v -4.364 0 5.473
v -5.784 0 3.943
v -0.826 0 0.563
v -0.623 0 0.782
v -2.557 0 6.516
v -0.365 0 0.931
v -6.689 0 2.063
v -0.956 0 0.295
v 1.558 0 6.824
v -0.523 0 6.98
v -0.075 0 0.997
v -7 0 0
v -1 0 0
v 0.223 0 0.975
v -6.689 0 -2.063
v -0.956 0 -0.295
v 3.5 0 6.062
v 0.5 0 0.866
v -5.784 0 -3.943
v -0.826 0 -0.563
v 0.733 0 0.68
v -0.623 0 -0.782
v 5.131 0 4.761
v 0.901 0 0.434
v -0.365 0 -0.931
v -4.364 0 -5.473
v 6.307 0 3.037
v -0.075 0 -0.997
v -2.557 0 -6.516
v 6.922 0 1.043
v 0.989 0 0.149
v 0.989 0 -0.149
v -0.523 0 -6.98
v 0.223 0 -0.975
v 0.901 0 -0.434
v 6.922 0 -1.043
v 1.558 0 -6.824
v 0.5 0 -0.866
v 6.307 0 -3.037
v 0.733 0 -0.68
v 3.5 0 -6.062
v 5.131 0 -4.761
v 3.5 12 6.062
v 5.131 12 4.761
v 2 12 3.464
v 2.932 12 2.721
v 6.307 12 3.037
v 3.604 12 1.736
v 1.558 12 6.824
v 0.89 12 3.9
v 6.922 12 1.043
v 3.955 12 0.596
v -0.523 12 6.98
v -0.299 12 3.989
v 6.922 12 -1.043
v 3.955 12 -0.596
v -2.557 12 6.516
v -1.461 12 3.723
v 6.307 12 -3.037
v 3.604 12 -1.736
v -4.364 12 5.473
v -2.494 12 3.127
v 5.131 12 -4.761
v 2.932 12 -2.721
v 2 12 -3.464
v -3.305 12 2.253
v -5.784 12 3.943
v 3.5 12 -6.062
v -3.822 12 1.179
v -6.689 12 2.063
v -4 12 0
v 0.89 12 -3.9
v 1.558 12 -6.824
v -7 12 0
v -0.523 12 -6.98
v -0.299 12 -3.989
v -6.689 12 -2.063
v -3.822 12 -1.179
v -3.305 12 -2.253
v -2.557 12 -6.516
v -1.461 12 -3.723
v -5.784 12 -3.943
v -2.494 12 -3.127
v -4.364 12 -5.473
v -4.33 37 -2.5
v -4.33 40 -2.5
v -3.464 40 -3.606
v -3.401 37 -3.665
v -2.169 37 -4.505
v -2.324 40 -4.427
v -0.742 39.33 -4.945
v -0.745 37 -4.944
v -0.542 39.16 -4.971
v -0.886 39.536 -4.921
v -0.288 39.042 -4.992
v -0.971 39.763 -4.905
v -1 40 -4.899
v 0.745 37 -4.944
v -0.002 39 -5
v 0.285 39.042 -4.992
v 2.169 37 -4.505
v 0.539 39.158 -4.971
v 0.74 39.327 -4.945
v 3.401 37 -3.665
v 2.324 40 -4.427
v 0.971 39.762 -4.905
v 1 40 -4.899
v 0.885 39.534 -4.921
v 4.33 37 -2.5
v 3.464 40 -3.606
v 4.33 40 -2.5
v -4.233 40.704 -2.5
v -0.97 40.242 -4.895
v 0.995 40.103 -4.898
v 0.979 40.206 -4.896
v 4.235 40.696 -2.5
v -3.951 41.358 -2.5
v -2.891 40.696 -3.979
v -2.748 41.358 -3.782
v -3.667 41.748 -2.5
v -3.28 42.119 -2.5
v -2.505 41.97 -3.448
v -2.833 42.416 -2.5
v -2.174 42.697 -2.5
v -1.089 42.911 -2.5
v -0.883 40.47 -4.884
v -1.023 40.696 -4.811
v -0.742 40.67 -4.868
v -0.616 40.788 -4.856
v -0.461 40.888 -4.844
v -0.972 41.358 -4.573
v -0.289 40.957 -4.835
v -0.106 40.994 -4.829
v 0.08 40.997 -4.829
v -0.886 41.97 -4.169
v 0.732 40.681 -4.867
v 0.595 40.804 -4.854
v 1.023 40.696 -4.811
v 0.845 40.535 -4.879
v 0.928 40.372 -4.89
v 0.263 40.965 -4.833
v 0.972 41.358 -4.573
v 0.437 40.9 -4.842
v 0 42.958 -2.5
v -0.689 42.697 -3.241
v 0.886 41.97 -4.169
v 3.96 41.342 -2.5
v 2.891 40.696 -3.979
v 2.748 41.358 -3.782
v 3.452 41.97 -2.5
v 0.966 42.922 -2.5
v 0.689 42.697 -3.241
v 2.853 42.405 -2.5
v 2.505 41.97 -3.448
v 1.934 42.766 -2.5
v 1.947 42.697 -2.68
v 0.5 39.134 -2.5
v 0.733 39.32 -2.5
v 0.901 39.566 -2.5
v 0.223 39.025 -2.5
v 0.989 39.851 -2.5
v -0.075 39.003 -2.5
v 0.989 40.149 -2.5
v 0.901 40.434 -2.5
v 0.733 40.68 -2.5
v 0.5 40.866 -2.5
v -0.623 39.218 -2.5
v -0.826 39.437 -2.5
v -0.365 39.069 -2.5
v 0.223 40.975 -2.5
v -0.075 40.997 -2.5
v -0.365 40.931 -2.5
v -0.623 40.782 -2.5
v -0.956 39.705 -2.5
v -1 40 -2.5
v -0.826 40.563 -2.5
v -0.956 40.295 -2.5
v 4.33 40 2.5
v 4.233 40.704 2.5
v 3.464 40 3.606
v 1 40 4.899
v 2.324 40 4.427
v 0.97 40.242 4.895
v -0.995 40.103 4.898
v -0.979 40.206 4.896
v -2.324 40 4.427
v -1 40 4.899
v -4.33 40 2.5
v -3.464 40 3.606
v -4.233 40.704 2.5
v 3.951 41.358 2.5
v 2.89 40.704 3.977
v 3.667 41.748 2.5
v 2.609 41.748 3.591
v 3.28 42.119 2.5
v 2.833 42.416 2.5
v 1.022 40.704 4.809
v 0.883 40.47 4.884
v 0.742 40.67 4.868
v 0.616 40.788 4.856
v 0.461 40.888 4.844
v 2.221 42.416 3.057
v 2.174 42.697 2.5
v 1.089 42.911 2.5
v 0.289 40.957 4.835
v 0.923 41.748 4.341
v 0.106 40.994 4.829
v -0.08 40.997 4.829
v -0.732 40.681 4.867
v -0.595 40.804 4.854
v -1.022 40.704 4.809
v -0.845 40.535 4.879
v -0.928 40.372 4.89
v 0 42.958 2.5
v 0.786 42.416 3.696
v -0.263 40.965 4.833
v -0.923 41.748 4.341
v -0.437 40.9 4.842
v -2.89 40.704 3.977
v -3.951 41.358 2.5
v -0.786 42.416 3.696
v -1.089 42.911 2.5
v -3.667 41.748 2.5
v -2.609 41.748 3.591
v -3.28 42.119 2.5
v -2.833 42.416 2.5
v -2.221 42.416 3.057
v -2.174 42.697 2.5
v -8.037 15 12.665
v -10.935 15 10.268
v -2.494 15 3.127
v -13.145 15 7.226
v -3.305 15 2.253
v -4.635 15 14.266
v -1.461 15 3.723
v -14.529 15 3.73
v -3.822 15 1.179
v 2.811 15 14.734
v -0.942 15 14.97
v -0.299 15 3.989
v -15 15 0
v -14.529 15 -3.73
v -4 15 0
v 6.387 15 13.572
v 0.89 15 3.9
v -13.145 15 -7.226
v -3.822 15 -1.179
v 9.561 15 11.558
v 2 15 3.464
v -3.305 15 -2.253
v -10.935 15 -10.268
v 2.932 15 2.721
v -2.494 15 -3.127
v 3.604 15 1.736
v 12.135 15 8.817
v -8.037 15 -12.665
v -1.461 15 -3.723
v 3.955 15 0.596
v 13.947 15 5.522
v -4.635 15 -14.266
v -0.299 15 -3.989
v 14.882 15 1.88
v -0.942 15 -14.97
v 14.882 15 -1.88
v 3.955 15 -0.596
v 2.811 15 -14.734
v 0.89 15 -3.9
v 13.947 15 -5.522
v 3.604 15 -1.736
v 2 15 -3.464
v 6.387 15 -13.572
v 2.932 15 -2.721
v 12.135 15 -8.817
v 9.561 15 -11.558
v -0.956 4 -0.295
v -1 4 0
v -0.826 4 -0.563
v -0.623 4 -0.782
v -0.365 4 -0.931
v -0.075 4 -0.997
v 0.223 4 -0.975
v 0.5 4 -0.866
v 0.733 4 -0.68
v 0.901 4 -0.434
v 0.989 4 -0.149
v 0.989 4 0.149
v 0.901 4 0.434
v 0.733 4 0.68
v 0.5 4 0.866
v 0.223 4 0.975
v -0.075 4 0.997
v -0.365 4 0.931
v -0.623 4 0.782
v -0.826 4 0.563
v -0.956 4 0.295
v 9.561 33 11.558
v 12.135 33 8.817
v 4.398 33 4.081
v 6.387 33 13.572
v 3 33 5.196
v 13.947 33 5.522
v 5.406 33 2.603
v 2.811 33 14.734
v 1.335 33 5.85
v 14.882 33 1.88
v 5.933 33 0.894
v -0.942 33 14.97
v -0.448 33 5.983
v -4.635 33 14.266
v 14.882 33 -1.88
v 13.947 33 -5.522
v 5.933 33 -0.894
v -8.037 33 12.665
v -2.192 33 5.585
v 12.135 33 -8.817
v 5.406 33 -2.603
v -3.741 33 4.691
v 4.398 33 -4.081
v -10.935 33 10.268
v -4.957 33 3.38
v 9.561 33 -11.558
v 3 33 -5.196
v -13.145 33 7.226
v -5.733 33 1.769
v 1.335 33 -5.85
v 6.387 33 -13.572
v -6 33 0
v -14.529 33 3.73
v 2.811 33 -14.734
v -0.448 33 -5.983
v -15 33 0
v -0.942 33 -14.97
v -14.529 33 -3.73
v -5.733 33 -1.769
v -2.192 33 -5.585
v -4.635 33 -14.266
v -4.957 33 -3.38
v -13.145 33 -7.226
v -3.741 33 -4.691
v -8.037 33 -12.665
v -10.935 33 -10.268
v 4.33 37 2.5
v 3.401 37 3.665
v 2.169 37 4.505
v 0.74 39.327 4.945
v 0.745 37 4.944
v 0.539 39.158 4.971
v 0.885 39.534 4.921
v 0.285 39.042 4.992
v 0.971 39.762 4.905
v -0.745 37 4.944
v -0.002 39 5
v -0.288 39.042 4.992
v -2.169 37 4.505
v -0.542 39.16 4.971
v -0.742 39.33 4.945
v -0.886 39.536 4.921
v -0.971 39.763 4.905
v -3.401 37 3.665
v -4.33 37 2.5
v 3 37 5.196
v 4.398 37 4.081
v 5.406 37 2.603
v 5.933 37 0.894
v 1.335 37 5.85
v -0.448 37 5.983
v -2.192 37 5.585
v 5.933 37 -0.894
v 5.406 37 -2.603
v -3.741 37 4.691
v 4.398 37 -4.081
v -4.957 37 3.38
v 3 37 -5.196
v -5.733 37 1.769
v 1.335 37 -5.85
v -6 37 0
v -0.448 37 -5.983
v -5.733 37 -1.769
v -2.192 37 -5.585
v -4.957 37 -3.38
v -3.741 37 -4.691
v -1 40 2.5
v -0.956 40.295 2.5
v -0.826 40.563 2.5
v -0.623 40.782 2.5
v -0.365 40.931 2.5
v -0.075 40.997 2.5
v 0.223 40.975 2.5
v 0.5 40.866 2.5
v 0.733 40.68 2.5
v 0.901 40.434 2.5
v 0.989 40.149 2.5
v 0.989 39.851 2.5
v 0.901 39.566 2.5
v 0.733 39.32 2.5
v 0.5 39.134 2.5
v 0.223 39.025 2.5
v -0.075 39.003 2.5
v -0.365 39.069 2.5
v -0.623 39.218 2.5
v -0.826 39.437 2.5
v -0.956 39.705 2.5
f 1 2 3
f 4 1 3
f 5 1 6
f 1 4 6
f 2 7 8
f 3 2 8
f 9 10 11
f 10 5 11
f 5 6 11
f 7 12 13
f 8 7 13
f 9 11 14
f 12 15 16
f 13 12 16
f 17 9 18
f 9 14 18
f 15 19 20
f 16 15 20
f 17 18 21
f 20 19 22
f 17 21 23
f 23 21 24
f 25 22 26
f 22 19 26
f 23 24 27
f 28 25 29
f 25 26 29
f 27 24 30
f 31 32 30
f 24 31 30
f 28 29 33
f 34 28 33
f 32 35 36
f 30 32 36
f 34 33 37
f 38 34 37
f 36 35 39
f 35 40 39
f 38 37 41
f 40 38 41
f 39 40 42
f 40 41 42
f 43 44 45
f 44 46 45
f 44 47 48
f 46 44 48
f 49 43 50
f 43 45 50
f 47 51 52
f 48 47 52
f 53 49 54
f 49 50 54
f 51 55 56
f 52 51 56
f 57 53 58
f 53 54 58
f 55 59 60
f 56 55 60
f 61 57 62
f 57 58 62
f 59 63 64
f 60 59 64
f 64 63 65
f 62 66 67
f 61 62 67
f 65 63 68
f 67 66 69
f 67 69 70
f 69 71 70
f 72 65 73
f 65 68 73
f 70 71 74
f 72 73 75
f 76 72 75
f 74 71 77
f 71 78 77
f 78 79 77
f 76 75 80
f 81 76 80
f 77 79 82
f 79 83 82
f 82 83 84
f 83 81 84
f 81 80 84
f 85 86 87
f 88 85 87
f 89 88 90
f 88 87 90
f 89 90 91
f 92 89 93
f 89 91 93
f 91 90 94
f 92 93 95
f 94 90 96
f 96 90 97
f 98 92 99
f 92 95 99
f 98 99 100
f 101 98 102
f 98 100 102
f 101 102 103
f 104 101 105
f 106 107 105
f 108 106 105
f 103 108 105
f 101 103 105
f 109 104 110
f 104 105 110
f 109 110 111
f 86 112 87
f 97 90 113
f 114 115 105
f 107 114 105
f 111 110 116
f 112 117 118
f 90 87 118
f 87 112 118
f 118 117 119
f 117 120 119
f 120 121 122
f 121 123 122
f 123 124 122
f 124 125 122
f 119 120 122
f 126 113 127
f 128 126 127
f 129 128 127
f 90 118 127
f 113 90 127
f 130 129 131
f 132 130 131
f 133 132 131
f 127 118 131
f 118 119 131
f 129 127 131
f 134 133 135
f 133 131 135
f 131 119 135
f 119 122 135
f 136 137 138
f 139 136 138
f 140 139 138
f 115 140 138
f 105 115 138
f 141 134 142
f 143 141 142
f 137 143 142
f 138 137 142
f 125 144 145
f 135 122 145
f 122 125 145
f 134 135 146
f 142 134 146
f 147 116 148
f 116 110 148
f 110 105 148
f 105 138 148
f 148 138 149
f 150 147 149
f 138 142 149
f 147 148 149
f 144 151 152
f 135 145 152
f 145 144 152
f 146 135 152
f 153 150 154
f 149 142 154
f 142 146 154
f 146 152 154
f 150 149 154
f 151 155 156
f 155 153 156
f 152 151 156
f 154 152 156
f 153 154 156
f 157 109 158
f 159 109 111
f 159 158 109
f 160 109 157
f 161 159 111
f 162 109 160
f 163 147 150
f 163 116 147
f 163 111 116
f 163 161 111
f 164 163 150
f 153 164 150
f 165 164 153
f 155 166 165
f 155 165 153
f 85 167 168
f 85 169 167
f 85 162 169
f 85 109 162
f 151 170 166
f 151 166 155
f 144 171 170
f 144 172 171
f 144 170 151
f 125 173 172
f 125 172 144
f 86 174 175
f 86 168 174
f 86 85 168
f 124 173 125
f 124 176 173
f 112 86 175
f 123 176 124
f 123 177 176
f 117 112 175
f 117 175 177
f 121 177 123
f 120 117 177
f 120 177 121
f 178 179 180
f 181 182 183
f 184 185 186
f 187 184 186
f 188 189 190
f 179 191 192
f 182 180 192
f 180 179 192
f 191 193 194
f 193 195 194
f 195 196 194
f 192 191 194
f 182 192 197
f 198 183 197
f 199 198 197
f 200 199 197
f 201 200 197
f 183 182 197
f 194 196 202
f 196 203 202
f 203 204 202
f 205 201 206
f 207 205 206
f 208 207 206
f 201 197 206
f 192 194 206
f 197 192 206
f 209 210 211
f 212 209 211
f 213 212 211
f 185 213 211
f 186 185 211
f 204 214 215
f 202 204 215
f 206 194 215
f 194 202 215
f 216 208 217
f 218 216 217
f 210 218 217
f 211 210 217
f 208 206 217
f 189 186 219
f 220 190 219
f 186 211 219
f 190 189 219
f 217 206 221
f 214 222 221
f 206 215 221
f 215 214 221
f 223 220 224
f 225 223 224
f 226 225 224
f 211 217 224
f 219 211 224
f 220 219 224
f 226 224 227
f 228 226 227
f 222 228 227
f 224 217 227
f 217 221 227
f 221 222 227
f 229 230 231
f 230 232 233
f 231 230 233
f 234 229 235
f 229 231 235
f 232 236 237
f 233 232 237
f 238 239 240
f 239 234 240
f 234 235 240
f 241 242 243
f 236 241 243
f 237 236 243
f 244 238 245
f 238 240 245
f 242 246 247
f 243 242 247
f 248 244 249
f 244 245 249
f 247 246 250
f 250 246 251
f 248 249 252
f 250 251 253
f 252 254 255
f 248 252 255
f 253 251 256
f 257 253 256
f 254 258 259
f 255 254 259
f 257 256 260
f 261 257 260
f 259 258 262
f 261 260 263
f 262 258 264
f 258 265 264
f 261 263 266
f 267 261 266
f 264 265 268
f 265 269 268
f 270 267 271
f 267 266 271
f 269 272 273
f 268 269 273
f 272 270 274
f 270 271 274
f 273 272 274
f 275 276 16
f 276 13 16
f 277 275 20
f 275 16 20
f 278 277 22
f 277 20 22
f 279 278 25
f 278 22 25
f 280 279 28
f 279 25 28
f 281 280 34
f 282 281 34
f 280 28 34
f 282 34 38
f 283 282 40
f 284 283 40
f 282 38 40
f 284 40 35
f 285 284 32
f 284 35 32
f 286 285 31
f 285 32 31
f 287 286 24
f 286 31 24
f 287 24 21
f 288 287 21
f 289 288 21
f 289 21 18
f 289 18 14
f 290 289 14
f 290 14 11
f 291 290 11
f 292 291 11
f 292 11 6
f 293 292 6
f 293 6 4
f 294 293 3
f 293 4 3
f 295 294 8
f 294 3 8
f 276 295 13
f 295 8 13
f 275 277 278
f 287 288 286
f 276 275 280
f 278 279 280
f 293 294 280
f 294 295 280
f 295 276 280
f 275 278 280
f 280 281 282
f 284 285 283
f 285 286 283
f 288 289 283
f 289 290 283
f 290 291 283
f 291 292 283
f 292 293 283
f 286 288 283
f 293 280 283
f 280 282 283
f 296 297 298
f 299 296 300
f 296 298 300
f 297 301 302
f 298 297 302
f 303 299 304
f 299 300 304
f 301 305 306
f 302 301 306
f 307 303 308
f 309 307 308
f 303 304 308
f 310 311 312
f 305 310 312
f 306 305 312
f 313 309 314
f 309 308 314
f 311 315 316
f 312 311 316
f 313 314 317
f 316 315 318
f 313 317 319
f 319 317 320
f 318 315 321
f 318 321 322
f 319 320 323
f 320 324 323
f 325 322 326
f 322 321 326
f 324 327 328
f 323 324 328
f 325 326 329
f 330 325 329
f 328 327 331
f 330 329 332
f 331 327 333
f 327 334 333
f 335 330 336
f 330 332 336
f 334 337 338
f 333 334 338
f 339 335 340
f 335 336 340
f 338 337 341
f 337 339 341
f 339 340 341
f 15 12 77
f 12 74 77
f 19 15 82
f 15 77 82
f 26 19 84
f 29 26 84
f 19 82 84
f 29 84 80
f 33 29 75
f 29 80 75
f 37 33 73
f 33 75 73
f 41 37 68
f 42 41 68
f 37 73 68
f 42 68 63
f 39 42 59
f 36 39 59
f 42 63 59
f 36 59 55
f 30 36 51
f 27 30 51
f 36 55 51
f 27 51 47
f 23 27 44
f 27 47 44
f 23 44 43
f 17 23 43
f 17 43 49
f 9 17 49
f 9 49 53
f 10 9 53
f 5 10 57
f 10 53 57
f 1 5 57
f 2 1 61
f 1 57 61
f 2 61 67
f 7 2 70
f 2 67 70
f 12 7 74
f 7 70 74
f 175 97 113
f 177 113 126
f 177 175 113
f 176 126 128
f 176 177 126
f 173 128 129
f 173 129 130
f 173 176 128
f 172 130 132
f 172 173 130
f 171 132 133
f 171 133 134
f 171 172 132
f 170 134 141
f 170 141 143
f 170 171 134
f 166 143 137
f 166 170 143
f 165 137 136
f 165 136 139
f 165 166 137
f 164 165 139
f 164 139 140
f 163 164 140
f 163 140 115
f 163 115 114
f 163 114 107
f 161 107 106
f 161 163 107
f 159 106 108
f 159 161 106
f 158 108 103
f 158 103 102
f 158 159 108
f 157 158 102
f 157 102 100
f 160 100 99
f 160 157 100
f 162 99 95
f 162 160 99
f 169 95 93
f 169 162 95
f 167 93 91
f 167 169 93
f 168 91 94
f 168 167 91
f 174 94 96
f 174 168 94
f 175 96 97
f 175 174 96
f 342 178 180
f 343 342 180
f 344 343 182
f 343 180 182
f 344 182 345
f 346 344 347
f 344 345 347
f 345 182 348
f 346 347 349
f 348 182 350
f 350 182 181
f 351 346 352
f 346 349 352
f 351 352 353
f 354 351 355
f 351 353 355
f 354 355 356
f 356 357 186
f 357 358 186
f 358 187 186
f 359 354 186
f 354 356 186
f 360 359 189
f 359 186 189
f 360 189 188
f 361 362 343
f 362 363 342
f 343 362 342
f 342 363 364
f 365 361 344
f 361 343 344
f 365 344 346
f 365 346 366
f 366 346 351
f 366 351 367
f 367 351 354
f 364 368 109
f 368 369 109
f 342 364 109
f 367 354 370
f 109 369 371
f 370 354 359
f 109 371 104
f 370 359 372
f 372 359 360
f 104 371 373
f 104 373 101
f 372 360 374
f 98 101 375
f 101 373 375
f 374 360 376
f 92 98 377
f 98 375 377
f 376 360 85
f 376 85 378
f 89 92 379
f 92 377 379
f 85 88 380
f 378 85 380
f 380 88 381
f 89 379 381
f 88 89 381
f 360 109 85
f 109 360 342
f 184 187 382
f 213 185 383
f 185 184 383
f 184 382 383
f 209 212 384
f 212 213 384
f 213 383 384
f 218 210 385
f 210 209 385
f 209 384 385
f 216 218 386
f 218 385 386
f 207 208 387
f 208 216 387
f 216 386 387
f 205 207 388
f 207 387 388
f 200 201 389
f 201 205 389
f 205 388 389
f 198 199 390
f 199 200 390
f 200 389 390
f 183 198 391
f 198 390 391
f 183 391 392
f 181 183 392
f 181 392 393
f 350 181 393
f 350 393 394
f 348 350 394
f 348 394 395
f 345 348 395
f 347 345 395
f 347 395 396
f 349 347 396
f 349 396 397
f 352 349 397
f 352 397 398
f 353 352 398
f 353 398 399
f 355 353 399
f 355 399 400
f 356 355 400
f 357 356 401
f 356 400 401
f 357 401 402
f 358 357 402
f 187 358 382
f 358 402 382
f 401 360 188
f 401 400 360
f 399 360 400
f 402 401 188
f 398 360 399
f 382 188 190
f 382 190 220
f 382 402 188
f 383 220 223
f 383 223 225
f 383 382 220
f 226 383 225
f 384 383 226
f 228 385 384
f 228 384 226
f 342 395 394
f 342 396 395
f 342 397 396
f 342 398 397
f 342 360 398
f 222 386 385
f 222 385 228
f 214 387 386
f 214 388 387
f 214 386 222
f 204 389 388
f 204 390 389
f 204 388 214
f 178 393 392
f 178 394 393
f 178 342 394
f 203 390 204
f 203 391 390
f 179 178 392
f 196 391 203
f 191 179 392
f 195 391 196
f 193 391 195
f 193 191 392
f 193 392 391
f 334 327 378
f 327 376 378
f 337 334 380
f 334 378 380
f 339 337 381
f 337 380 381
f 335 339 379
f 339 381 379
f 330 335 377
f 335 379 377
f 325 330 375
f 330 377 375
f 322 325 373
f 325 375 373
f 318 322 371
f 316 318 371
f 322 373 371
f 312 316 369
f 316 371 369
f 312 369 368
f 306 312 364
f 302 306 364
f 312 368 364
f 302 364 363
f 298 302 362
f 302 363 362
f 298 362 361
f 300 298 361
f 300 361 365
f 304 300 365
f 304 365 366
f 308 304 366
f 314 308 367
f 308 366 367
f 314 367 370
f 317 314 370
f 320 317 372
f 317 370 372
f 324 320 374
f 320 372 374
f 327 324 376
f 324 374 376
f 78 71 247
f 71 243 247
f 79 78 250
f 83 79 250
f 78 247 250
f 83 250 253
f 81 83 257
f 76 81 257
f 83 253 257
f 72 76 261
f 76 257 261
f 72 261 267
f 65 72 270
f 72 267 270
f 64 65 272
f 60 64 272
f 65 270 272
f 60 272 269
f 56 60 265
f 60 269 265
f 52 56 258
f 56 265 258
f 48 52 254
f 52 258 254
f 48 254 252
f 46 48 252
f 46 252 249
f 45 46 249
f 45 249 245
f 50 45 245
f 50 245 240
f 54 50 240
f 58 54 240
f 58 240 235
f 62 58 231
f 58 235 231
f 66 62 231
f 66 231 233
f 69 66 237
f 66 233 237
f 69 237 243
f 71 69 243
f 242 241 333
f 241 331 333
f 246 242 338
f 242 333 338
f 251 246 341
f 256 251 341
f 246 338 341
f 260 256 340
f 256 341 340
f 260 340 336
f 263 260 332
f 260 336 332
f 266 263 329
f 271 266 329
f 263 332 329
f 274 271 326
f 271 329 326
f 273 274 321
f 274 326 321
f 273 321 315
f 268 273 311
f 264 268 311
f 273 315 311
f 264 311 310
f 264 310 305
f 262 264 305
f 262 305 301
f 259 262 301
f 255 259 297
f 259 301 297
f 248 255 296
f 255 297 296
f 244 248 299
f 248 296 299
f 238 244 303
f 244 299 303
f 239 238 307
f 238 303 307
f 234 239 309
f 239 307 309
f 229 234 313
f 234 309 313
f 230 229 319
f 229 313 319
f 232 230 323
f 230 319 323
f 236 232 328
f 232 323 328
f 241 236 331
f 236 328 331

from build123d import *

# Parameters (mm, degrees)
FILLET1_R               = 3
CUT_EXTRUDE1_DEPTH      = 10
CUT_EXTRUDE1_DEPTH_BACK = 10
SKETCH3_W               = 5
SKETCH3_H               = 6
CUT_EXTRUDE2_DEPTH      = 10
CUT_EXTRUDE2_DEPTH_BACK = 10
SKETCH4_R               = 1


with BuildPart() as part:
    # Sketch2 → Revolve1 (revolve)
    with BuildSketch(Plane.XY):
        Polygon((-4, 12), (-4, 15), (-15, 15), (-15, 33), (-6, 33), (-6, 37), (-5, 37), (-5, 43), (0, 43), (0, 37), (0, 4), (-1, 4), (-1, 0), (-7, 0), (-7, 12), align=None)
    revolve(axis=Axis((0, 37, 0), (0, -1, 0)))

    # Fillet1
    fillet1_edges = [part.edges().sort_by_distance(p)[0] for p in [
        (5, 43, 0),
    ]]
    fillet(fillet1_edges, radius=FILLET1_R)

    # Sketch3 → Cut-Extrude1 (cut, two sides: drawn at the far end of the back side and taken through both)
    with BuildSketch(Plane(origin=(0, 0, 0), x_dir=(0, 0, -1), z_dir=(1, 0, 0)).offset(-CUT_EXTRUDE1_DEPTH_BACK)):
        with Locations((0, 40)):
            Rectangle(SKETCH3_W, SKETCH3_H)
    extrude(amount=CUT_EXTRUDE1_DEPTH + CUT_EXTRUDE1_DEPTH_BACK, mode=Mode.SUBTRACT)

    # Sketch4 → Cut-Extrude2 (cut, two sides: drawn at the far end of the back side and taken through both)
    with BuildSketch(Plane(origin=(0, 0, 2.5), x_dir=(-1, 0, 0), z_dir=(0, 0, -1)).offset(-CUT_EXTRUDE2_DEPTH_BACK)):
        with Locations((0, 40)):
            Circle(SKETCH4_R)
    extrude(amount=CUT_EXTRUDE2_DEPTH + CUT_EXTRUDE2_DEPTH_BACK, mode=Mode.SUBTRACT)


solid = part.part
